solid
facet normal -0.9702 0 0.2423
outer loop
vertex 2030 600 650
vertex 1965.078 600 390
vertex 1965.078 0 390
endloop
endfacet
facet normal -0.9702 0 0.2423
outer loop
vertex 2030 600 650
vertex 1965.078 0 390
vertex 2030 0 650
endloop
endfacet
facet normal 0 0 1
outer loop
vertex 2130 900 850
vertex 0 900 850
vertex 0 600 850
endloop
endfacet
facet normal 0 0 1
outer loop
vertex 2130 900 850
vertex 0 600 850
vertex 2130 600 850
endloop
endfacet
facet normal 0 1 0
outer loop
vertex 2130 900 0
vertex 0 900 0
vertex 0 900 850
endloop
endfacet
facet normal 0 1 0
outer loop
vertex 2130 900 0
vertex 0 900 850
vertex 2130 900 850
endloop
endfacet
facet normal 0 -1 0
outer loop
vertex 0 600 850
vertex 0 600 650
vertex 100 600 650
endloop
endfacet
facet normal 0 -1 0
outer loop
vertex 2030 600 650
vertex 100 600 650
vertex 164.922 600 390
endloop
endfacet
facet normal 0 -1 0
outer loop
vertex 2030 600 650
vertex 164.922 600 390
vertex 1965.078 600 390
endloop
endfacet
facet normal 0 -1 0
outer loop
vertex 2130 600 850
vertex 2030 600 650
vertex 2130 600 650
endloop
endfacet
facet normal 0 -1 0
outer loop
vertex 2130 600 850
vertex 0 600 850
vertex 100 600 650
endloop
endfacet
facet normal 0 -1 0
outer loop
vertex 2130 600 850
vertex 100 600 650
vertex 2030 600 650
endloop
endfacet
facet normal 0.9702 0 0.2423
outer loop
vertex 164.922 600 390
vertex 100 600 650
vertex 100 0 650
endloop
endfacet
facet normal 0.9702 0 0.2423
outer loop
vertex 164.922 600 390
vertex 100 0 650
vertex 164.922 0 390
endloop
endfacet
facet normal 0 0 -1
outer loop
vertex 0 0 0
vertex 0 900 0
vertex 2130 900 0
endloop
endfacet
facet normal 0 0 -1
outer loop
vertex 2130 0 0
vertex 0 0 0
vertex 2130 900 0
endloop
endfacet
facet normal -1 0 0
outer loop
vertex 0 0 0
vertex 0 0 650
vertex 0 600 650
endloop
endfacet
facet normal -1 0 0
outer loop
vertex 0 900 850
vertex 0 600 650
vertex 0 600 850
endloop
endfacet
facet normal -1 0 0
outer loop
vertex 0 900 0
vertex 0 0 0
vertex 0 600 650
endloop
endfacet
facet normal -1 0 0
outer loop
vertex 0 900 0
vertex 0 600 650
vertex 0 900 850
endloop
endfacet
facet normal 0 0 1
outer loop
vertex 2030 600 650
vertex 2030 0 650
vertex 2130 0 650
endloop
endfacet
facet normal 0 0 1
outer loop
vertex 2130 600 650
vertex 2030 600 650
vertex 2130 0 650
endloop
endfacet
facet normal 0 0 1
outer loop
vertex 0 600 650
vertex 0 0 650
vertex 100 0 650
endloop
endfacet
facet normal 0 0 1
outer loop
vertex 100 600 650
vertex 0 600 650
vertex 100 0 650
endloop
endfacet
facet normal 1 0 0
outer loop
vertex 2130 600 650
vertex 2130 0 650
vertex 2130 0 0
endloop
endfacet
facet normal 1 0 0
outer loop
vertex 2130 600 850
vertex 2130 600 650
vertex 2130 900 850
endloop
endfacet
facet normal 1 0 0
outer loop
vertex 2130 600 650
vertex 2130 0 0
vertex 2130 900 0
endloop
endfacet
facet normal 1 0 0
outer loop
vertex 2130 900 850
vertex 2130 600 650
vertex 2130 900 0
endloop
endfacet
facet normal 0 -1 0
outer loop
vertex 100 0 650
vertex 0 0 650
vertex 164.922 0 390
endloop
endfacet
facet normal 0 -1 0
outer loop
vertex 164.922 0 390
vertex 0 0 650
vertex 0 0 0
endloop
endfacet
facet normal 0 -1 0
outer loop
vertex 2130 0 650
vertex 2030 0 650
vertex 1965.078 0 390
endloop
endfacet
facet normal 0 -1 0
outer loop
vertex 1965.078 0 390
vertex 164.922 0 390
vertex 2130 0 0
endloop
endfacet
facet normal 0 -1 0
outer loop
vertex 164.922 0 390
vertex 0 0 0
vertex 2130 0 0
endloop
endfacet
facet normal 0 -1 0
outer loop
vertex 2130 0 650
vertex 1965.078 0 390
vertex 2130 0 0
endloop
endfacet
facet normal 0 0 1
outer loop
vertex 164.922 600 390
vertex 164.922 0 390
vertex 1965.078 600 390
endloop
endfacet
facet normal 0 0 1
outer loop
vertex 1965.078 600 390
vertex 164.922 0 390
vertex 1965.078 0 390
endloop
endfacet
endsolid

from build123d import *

# Parameters (mm, degrees)
SKETCH_W     = 2130
SKETCH_H     = 900
PAD_DEPTH    = 850
POCKET_DEPTH = 600


with BuildPart() as part:
    # Sketch → Pad (new body)
    with BuildSketch(Plane.XY):
        with Locations((1065, 450)):
            Rectangle(SKETCH_W, SKETCH_H)
    extrude(amount=PAD_DEPTH)

    # Sketch001 (on Face1 of Pad) → Pocket (cut)
    with BuildSketch(Plane.XZ):
        Polygon((0, 650), (100, 650), (164.921688, 390), (1965.078312, 390), (2030, 650), (2130, 650), (2130, 850), (0, 850), align=None)
    extrude(amount=-POCKET_DEPTH, mode=Mode.SUBTRACT)


solid = part.part
